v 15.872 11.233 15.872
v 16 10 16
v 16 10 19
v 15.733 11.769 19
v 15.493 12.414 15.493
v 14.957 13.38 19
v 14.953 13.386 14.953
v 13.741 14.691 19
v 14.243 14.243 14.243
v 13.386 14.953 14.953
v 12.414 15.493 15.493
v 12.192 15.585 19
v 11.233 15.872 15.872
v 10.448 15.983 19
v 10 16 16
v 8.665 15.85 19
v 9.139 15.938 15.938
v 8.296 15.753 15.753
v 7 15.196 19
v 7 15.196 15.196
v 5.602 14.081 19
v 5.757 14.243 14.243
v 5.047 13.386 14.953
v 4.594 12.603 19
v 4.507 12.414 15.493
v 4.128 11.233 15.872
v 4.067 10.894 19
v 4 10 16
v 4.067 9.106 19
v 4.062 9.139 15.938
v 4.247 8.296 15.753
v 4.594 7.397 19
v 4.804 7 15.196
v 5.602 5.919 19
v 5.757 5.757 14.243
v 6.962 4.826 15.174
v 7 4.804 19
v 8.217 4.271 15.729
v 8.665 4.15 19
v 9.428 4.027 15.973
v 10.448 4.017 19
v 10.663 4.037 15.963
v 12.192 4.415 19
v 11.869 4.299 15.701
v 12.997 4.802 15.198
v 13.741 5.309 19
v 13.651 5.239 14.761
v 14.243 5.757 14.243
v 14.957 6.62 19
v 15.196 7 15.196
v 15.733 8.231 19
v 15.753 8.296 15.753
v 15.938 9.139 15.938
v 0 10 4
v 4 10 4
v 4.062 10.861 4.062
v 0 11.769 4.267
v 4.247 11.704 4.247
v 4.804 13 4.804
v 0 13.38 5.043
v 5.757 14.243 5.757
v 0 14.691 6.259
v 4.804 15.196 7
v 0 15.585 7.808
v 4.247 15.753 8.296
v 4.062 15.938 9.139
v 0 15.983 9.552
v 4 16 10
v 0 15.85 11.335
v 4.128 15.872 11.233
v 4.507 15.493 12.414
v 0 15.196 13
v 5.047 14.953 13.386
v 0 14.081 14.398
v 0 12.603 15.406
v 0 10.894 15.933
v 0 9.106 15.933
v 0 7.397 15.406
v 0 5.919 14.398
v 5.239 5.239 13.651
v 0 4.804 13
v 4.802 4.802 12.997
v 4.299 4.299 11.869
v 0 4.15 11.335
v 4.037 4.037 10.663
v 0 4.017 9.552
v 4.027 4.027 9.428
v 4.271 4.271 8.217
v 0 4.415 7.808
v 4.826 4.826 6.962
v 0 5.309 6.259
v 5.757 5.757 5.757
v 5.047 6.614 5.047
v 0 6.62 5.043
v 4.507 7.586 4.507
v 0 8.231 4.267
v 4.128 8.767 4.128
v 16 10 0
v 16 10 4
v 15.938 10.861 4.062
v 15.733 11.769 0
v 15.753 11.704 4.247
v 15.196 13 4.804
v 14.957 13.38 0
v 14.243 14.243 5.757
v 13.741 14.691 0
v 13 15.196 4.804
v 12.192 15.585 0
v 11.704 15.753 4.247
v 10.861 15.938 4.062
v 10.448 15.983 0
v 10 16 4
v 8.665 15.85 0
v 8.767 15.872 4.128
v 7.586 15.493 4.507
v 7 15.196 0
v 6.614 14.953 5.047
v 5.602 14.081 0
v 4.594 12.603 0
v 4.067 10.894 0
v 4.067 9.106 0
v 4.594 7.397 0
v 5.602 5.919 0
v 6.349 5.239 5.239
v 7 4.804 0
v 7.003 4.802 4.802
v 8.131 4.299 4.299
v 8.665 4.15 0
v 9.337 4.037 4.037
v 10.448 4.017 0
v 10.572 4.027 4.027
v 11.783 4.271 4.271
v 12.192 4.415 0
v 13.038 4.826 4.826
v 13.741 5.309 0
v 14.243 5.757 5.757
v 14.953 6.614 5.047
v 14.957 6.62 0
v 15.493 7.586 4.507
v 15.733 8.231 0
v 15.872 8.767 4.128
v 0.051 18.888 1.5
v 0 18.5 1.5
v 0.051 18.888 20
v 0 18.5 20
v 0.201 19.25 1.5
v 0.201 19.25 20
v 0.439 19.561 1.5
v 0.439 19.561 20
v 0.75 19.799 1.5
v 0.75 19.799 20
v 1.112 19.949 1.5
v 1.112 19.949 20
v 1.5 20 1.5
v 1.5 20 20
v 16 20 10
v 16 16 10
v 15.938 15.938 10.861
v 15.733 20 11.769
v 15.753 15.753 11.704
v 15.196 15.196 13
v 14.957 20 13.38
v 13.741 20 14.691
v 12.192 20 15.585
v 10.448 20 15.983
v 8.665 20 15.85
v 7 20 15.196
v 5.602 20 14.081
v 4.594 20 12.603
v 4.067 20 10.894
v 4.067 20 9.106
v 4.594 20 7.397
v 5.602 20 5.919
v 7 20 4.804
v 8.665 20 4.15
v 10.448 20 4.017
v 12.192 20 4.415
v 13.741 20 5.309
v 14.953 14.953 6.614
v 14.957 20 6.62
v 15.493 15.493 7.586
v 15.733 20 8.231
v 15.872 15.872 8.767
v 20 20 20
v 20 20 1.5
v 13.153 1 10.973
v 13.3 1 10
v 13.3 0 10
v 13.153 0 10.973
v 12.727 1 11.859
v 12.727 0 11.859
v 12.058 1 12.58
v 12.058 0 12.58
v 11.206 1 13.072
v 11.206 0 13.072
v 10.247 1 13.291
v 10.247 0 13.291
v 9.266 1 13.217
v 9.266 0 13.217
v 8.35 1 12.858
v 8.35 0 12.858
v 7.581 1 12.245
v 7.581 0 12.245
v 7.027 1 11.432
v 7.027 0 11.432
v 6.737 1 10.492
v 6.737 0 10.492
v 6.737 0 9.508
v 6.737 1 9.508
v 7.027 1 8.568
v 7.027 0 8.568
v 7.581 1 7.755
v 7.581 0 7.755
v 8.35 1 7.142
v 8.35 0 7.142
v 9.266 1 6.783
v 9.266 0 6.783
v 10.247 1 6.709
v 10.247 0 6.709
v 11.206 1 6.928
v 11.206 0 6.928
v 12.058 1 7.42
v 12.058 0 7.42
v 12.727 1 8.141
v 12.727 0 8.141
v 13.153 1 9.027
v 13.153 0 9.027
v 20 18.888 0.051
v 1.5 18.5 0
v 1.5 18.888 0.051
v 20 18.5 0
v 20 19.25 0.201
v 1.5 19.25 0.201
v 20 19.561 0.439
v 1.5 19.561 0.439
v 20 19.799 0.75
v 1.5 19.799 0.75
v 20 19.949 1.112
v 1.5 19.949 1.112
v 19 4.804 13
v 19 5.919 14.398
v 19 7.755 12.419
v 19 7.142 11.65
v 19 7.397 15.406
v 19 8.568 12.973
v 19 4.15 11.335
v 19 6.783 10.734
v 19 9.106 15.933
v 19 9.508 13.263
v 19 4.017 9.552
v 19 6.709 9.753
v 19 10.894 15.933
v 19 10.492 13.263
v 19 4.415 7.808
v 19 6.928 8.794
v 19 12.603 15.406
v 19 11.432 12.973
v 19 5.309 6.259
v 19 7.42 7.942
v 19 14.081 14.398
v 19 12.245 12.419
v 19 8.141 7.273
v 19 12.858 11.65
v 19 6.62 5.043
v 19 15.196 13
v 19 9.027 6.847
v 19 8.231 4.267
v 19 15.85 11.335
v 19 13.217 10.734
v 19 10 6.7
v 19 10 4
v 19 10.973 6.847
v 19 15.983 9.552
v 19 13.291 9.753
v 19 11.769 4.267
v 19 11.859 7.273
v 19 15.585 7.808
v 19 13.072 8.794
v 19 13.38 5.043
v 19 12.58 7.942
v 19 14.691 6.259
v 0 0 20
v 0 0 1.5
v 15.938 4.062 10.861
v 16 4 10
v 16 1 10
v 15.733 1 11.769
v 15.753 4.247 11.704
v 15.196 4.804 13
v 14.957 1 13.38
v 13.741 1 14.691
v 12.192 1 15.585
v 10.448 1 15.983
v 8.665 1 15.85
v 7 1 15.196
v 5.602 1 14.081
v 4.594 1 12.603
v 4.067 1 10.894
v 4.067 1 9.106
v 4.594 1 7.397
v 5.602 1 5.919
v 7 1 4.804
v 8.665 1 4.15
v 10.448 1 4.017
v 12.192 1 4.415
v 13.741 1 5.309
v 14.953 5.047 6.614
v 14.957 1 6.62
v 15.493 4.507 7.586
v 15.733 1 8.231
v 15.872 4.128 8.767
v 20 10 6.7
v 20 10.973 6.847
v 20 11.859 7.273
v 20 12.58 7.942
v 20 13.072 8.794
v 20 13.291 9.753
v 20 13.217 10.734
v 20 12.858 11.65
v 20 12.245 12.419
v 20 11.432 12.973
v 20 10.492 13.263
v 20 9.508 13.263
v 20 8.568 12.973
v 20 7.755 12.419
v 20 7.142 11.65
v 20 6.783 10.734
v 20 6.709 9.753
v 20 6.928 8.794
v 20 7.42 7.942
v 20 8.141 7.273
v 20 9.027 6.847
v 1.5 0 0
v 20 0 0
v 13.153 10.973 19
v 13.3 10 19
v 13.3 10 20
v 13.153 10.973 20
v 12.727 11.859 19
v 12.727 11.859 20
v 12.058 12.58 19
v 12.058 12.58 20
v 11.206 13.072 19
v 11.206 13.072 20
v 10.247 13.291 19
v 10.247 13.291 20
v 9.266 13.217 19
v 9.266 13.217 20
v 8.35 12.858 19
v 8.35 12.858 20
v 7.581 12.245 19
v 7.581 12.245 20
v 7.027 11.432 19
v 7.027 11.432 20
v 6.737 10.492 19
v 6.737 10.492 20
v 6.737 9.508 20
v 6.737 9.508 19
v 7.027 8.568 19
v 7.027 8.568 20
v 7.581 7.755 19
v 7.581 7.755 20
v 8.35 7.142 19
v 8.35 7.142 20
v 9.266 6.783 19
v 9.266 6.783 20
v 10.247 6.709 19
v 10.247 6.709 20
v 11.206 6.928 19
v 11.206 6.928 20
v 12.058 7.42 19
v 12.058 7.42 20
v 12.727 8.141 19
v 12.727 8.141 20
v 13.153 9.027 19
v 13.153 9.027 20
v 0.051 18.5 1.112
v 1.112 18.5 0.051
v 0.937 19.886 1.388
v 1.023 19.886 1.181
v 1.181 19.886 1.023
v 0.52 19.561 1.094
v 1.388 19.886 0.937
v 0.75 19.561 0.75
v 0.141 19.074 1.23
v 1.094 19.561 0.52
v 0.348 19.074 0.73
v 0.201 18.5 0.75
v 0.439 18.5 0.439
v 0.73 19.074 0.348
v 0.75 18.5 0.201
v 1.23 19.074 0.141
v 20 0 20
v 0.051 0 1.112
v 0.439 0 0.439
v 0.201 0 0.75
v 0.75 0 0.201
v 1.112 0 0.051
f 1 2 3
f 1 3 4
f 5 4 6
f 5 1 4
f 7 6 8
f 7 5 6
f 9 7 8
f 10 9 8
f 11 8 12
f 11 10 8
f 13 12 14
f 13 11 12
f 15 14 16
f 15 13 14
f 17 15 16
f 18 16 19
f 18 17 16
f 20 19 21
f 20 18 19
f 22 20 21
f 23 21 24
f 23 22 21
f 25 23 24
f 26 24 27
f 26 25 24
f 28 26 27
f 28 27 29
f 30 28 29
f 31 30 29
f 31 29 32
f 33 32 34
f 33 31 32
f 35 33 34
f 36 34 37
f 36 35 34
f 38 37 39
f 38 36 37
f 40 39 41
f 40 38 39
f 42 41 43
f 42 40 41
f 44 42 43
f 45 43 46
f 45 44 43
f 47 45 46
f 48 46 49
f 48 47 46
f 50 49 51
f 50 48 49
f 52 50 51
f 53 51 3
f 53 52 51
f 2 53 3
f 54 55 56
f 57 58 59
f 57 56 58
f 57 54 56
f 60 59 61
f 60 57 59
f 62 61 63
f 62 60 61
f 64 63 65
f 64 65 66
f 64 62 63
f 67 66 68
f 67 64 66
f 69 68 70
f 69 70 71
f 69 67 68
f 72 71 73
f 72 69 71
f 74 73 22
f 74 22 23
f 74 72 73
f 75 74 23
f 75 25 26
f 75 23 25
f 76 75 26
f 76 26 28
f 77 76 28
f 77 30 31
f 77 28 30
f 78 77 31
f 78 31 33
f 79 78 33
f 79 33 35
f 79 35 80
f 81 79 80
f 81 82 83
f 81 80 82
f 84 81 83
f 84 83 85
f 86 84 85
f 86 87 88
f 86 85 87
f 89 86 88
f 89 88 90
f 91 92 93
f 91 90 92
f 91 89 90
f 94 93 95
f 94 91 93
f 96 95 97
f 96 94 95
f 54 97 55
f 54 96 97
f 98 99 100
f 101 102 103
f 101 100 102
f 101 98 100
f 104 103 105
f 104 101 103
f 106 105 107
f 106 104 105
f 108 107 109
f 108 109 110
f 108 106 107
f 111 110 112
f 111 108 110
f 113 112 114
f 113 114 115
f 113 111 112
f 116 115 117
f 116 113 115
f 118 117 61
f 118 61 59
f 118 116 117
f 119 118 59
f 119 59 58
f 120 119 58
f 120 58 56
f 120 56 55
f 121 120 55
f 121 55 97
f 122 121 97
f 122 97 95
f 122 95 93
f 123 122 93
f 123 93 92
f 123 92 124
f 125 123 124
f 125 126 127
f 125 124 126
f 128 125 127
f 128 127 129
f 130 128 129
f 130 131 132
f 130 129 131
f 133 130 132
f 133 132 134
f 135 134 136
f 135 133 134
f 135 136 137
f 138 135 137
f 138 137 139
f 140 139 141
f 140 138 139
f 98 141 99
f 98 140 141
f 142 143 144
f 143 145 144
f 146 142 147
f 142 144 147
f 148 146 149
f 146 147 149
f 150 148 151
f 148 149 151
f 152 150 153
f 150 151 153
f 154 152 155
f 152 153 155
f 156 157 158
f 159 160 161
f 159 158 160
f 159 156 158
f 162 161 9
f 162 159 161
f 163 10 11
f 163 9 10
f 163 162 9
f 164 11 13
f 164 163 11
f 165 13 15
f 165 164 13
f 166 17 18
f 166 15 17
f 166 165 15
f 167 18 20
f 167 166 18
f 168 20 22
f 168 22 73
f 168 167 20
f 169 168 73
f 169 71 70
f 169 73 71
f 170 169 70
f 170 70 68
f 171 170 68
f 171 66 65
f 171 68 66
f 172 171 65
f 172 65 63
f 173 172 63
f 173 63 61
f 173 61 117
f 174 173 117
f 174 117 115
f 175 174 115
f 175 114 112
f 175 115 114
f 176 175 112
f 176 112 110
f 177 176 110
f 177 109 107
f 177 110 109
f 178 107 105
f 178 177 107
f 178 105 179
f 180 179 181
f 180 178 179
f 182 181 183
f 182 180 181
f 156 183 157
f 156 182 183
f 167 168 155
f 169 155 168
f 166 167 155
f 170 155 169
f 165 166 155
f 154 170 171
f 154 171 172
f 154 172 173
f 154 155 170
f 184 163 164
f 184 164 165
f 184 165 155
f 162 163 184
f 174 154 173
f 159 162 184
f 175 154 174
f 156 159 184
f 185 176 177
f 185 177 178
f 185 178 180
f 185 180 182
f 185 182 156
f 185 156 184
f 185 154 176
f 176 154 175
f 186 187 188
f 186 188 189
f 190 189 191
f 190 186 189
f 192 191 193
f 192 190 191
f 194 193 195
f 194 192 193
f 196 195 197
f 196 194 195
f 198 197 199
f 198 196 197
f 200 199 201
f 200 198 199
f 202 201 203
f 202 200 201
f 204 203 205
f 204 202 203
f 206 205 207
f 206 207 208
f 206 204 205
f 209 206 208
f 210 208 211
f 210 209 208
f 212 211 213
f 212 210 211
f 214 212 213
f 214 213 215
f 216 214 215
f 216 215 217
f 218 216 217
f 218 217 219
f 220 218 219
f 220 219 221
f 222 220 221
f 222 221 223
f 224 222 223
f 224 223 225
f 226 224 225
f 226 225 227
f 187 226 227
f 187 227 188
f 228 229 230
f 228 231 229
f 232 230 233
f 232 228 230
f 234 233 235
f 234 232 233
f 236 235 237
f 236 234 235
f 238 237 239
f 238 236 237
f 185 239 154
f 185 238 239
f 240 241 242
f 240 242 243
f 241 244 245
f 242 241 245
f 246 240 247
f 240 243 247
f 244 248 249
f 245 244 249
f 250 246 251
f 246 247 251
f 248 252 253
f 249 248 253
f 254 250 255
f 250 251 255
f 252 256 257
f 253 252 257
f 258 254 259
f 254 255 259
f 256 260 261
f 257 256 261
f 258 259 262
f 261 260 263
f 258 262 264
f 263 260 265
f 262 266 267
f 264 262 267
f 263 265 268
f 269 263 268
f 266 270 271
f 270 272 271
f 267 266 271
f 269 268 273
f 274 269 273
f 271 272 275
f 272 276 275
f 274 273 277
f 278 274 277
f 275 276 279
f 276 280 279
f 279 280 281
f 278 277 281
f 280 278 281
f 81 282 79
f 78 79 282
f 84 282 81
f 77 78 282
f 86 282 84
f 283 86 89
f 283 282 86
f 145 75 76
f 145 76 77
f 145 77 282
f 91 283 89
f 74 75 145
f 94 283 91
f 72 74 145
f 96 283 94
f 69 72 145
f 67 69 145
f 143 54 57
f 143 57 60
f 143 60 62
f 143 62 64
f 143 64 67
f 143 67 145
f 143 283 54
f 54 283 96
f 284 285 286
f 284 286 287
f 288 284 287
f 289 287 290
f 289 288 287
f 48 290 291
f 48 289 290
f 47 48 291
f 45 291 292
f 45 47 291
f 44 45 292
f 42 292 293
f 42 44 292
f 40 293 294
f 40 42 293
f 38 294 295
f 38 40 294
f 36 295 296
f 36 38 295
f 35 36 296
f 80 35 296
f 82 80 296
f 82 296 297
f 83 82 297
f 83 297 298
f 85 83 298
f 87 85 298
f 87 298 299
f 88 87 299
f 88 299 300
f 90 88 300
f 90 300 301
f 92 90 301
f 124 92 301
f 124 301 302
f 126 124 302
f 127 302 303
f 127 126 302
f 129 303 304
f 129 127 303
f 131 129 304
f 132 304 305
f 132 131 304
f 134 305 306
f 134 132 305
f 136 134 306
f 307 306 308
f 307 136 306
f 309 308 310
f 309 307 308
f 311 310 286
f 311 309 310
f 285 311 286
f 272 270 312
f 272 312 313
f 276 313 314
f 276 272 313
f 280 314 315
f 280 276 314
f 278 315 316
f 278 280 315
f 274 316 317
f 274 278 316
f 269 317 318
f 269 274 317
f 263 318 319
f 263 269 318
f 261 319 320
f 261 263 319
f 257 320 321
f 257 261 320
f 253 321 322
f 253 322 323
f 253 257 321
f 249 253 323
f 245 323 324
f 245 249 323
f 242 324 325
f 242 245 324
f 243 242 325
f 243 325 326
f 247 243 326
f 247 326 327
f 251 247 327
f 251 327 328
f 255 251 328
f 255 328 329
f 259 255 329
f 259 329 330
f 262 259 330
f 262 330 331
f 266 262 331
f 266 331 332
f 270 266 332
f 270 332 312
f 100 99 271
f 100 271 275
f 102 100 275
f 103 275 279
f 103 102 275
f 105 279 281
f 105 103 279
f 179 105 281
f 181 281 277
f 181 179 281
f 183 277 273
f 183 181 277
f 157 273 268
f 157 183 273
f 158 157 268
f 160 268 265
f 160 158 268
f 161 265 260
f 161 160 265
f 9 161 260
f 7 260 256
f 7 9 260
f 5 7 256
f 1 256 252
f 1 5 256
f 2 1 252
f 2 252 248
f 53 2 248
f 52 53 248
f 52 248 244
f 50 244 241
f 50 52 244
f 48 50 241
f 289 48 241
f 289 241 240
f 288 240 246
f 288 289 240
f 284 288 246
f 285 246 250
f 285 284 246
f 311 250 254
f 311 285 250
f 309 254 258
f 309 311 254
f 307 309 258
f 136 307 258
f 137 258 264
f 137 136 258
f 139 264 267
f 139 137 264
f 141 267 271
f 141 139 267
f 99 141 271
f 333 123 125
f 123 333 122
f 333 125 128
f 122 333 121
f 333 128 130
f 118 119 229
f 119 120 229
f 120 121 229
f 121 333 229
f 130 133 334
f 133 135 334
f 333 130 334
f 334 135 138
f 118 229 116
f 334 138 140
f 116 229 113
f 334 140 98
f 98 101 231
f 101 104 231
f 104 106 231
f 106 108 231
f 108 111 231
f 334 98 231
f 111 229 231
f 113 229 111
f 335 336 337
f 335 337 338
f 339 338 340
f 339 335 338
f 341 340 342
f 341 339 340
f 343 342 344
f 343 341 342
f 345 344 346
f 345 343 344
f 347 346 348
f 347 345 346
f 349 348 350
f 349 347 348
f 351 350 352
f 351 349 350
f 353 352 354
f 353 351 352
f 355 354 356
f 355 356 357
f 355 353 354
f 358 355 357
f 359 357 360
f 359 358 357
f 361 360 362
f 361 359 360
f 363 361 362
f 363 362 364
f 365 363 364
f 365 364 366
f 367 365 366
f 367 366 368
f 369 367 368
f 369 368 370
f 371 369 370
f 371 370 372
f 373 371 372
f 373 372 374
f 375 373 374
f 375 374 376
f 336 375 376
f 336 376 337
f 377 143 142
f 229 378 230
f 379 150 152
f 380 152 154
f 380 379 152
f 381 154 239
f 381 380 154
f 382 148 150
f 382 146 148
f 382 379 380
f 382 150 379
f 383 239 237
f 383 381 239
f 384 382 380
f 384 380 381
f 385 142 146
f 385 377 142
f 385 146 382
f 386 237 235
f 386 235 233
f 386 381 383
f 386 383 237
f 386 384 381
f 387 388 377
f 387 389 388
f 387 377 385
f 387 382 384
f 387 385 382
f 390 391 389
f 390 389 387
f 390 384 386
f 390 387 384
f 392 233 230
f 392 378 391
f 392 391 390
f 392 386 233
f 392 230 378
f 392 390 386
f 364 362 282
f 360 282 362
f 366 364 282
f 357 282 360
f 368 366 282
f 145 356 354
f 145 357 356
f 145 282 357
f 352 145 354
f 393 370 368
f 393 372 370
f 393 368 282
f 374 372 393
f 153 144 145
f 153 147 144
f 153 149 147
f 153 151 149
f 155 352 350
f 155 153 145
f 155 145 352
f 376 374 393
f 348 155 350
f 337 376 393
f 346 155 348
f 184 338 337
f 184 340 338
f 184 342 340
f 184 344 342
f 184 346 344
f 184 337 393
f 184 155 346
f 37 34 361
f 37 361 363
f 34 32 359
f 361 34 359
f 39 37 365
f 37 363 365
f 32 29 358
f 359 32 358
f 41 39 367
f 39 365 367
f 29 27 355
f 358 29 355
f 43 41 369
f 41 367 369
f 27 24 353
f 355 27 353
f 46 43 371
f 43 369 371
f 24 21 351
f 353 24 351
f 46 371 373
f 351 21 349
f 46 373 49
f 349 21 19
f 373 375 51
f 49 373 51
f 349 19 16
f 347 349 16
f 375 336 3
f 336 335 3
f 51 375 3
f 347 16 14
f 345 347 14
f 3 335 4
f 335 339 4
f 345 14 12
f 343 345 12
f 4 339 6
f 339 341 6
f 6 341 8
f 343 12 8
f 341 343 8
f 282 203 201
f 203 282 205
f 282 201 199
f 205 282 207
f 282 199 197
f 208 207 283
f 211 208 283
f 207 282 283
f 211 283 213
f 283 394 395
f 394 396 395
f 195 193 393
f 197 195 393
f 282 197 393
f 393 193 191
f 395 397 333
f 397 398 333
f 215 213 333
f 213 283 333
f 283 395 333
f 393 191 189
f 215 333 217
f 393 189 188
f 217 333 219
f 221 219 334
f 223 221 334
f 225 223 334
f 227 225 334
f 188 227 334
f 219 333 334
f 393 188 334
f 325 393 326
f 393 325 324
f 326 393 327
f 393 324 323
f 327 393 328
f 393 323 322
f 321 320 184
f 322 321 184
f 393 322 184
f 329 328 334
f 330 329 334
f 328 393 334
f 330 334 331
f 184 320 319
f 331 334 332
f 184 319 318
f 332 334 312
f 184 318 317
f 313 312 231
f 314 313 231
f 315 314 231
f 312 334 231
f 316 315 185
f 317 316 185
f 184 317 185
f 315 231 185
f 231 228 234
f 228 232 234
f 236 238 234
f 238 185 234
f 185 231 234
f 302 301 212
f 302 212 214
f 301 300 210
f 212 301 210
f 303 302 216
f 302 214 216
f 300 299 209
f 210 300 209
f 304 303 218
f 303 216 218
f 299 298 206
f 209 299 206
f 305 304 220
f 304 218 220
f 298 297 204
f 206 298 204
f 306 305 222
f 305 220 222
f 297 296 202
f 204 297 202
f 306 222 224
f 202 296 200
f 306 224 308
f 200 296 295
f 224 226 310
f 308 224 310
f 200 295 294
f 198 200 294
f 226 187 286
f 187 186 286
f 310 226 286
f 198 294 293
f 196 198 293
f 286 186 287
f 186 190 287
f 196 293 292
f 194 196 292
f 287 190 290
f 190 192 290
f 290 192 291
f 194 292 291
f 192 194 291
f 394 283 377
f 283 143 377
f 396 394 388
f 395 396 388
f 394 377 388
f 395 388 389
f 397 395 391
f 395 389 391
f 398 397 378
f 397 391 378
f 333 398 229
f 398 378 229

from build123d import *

# Parameters (mm, degrees)
CYLINDER_R        = 3.3
CYLINDER_DEPTH    = 20
CYLINDER001_R     = 3.3
CYLINDER001_DEPTH = 20
CYLINDER002_R     = 3.3
CYLINDER002_DEPTH = 20
CYLINDER003_R     = 6
CYLINDER003_DEPTH = 19
CYLINDER004_R     = 6
CYLINDER004_DEPTH = 19
CYLINDER005_R     = 6
CYLINDER005_DEPTH = 19
BOX_W             = 20
BOX_H             = 20
BOX_DEPTH         = 20
FILLET_R          = 1.5


with BuildPart() as cylinder:
    # Cylinder → Cylinder (new body)
    with BuildSketch(Plane(origin=(10, 10, 0), x_dir=(1, 0, 0), z_dir=(0, 0, 1))):
        Circle(CYLINDER_R)
    extrude(amount=CYLINDER_DEPTH)


with BuildPart() as cylinder001:
    # Cylinder001 → Cylinder001 (new body)
    with BuildSketch(Plane(origin=(10, 20, 10), x_dir=(1, 0, 0), z_dir=(0, -1, 0))):
        Circle(CYLINDER001_R)
    extrude(amount=CYLINDER001_DEPTH)


with BuildPart() as cylinder002:
    # Cylinder002 → Cylinder002 (new body)
    with BuildSketch(Plane(origin=(0, 10, 10), x_dir=(0, 0, -1), z_dir=(1, 0, 0))):
        Circle(CYLINDER002_R)
    extrude(amount=CYLINDER002_DEPTH)


with BuildPart() as cylinder003:
    # Cylinder003 → Cylinder003 (new body)
    with BuildSketch(Plane(origin=(0, 10, 10), x_dir=(0, 0, -1), z_dir=(1, 0, 0))):
        Circle(CYLINDER003_R)
    extrude(amount=CYLINDER003_DEPTH)


with BuildPart() as cylinder004:
    # Cylinder004 → Cylinder004 (new body)
    with BuildSketch(Plane(origin=(10, 10, 0), x_dir=(1, 0, 0), z_dir=(0, 0, 1))):
        Circle(CYLINDER004_R)
    extrude(amount=CYLINDER004_DEPTH)


with BuildPart() as fusion:
    # Cylinder005 → Cylinder005 (new body)
    with BuildSketch(Plane(origin=(10, 20, 10), x_dir=(1, 0, 0), z_dir=(0, -1, 0))):
        Circle(CYLINDER005_R)
    extrude(amount=CYLINDER005_DEPTH)

    # Fusion: union Cylinder, Cylinder001, Cylinder002, Cylinder003, Cylinder004
    add(cylinder.part)
    add(cylinder001.part)
    add(cylinder002.part)
    add(cylinder003.part)
    add(cylinder004.part)


with BuildPart() as f_20x20connectorcube:
    # Box → Box (new body)
    with BuildSketch(Plane.XY):
        with Locations((10, 10)):
            Rectangle(BOX_W, BOX_H)
    extrude(amount=BOX_DEPTH)

    # Cut: cut Fusion
    add(fusion.part, mode=Mode.SUBTRACT)

    # Fillet
    fillet_edges = [f_20x20connectorcube.edges().sort_by_distance(p)[0] for p in [
        (0, 10, 0),
        (0, 20, 10),
        (10, 20, 0),
    ]]
    fillet(fillet_edges, radius=FILLET_R)


solid = f_20x20connectorcube.part
